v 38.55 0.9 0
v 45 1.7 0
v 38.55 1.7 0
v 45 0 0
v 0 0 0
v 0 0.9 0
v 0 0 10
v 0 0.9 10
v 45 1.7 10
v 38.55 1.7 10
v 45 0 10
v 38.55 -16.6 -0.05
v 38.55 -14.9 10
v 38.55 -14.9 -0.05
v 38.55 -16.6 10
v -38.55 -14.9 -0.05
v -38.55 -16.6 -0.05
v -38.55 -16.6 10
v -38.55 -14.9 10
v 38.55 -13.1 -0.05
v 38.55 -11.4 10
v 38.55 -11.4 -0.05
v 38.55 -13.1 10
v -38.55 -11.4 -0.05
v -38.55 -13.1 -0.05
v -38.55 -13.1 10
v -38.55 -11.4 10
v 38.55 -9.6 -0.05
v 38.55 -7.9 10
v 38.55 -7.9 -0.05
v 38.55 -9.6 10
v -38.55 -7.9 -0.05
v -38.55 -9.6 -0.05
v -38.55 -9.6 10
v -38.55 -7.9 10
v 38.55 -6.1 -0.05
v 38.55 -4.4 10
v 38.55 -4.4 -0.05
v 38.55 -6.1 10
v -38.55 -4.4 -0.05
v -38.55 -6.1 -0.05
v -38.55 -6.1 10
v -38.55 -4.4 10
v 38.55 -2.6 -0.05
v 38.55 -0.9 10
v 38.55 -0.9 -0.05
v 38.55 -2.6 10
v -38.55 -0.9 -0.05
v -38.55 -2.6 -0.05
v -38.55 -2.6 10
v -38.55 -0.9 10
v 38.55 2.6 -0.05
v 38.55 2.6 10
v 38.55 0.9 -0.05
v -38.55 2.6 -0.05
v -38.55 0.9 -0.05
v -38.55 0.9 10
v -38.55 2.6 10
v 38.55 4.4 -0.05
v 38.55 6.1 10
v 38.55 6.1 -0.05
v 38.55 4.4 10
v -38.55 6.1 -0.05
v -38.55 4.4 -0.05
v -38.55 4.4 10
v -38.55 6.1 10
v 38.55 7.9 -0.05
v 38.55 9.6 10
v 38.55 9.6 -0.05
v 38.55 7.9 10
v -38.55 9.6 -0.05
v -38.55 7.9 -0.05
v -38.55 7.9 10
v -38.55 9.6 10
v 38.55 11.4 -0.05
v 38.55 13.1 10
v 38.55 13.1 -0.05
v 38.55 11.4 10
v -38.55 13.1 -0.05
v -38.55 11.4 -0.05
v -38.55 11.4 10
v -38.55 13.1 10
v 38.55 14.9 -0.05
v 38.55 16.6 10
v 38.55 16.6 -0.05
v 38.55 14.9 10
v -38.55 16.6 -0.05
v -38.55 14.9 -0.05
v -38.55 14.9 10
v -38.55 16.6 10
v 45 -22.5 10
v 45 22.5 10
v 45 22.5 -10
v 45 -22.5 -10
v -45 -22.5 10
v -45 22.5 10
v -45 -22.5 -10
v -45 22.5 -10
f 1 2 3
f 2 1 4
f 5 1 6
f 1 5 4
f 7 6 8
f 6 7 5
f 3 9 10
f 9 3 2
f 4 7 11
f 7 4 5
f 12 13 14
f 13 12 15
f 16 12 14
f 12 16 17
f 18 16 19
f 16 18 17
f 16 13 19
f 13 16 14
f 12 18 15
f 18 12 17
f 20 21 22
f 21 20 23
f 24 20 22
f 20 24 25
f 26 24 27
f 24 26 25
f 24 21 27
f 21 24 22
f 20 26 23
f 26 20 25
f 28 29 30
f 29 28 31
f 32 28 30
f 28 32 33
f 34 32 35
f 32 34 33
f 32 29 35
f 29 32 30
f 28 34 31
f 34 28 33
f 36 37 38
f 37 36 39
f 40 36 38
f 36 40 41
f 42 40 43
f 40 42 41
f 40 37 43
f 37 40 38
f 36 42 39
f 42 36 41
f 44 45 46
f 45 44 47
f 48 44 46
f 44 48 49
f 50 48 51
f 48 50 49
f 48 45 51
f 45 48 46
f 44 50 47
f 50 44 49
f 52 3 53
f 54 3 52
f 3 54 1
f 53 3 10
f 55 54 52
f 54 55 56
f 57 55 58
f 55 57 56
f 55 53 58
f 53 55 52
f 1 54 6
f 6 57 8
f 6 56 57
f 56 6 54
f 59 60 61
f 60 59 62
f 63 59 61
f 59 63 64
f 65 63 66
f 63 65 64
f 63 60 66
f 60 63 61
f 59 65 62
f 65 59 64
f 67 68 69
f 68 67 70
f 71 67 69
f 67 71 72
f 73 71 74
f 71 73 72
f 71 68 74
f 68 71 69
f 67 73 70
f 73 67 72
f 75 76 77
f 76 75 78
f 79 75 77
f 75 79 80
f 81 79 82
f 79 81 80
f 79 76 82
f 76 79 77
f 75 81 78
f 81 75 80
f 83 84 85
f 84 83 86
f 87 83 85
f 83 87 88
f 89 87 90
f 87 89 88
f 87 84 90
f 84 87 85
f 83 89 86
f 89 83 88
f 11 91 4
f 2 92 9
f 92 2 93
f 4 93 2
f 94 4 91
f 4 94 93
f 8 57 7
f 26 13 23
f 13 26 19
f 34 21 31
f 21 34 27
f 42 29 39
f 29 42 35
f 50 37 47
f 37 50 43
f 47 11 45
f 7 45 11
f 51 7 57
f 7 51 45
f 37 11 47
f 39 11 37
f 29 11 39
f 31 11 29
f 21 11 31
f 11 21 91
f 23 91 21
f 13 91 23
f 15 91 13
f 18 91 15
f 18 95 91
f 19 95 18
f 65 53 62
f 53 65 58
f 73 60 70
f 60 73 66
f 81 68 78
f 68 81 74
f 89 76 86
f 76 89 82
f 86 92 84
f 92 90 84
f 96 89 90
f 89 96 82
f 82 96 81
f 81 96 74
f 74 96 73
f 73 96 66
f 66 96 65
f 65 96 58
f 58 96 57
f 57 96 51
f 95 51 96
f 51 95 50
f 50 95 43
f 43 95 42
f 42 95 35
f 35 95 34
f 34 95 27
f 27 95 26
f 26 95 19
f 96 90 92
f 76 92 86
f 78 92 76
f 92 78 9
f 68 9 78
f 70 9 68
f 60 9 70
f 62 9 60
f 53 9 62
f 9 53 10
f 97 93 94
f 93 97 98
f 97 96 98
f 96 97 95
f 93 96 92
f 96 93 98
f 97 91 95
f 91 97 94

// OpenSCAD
// Dimensions for the drying rack
base_length = 90;      // X dimension of the base block
base_width = 45;       // Y dimension of the base block
base_height = 20;      // Z dimension of the base block

slide_length = 75;     // Length of the microscope slide (fits in X)
slide_width = 25;      // Width of the microscope slide (fits in Y)
slide_thickness = 1;   // Thickness of the microscope slide (fits in Z slot depth)

// Slot dimensions
slot_length = 77;      // Length of the slot (X direction)
slot_width = 1.6;      // Width of the slot (Y direction)
slot_depth = 10;       // Depth of the slot (Z direction)

// Slot arrangement
num_slots = 10;        // Number of slots
slot_pitch = 3.5;      // Centre-to-centre distance between slots (Y direction)

// Safety margin for boolean operations
cut_extend = 0.05;

// Calculate slot positions
// The group is centred on the block in X and Y.
// Block Y range: -base_width/2 to +base_width/2
// Slot Y range: -slot_length/2 to +slot_length/2 (since slot runs along X)
// Wait, the prompt says "slot runs along X". So the slot's long dimension is X.
// The slot's narrow dimension is Y (width).
// The slots are spaced in Y.

// Let's verify the slot orientation.
// "10 parallel slots... each slot runs along X" -> Slot length is along X.
// "77 mm long" -> X dimension of slot is 77.
// "1.6 mm wide (Y)" -> Y dimension of slot is 1.6.
// "10 mm deep" -> Z dimension of slot is 10.
// "3.5 mm apart centre-to-centre (in Y)" -> Spacing is along Y.

// Centering:
// Block X: -45 to 45. Slot X: -38.5 to 38.5. (77/2 = 38.5). This fits within 45.
// Block Y: -22.5 to 22.5.
// We need to place 10 slots with 3.5 mm pitch.
// Total width of slot group = (10 - 1) * 3.5 = 31.5 mm.
// The slots are centred in Y.
// Y positions:
// If we have 10 slots, let's index them from 0 to 9.
// Center of the group is 0.
// Positions: -15.75, -12.25, ..., 15.75.
// Let's calculate the first slot's center Y.
// y_centers = [-(num_slots-1)/2 * pitch, ..., (num_slots-1)/2 * pitch]
// For 10 slots: indices 0..9.
// Midpoint is between 4 and 5.
// y_0 = -4.5 * 3.5 = -15.75
// y_9 = 4.5 * 3.5 = 15.75
// This fits within Y range of -22.5 to 22.5.

// Slot X position:
// Slot length is 77. Block length is 90.
// Centered in X: X range is -38.5 to 38.5.

// Slot Y position:
// Slot width is 1.6.
// Centered at y_center. Y range is y_center - 0.8 to y_center + 0.8.

// Slot Z position:
// Open at the top. Top of block is Z = 20.
// Slot goes down 10 mm. So Z range is 10 to 20.
// To ensure clean boolean subtraction, we extend slightly past the faces.
// Top face Z=20. Extend up to 20 + cut_extend.
// Bottom of slot Z=10. Extend down to 10 - cut_extend.

$fn = 64;

module base_block() {
    cube([base_length, base_width, base_height], center = true);
}

module slot_cut(y_center) {
    // Slot runs along X, so X size is slot_length
    // Slot width is slot_width (Y)
    // Slot depth is slot_depth (Z)
    
    // X: centered at 0
    x_start = -slot_length/2 - cut_extend;
    x_end = slot_length/2 + cut_extend;
    
    // Y: centered at y_center
    y_start = y_center - slot_width/2 - cut_extend;
    y_end = y_center + slot_width/2 + cut_extend;
    
    // Z: from top (base_height/2) down to (base_height/2 - slot_depth)
    // Block top is at Z = base_height/2 = 10.
    // Slot bottom is at Z = 10 - 10 = 0.
    // We want the slot to be open at the top.
    // So the cut goes from Z = 10 + cut_extend down to Z = 0 - cut_extend.
    z_start = base_height/2 + cut_extend;
    z_end = base_height/2 - slot_depth - cut_extend;
    
    cube([x_end - x_start, y_end - y_start, z_start - z_end], 
         center = false);
    // Translate to position
    translate([0, y_center, (z_start + z_end)/2]) {
        cube([x_end - x_start, y_end - y_start, z_start - z_end], 
             center = true);
    }
}

module drying_rack() {
    difference() {
        base_block();
        
        for (i = [0 : num_slots - 1]) {
            // Calculate Y center for each slot
            // Symmetric distribution around 0
            // For even number of slots, the centers are at +/- 0.5 * pitch, +/- 1.5 * pitch, etc.
            // Formula: y = (i - (num_slots - 1) / 2) * pitch
            y_c = (i - (num_slots - 1) / 2) * slot_pitch;
            
            slot_cut(y_c);
        }
    }
}

drying_rack();
